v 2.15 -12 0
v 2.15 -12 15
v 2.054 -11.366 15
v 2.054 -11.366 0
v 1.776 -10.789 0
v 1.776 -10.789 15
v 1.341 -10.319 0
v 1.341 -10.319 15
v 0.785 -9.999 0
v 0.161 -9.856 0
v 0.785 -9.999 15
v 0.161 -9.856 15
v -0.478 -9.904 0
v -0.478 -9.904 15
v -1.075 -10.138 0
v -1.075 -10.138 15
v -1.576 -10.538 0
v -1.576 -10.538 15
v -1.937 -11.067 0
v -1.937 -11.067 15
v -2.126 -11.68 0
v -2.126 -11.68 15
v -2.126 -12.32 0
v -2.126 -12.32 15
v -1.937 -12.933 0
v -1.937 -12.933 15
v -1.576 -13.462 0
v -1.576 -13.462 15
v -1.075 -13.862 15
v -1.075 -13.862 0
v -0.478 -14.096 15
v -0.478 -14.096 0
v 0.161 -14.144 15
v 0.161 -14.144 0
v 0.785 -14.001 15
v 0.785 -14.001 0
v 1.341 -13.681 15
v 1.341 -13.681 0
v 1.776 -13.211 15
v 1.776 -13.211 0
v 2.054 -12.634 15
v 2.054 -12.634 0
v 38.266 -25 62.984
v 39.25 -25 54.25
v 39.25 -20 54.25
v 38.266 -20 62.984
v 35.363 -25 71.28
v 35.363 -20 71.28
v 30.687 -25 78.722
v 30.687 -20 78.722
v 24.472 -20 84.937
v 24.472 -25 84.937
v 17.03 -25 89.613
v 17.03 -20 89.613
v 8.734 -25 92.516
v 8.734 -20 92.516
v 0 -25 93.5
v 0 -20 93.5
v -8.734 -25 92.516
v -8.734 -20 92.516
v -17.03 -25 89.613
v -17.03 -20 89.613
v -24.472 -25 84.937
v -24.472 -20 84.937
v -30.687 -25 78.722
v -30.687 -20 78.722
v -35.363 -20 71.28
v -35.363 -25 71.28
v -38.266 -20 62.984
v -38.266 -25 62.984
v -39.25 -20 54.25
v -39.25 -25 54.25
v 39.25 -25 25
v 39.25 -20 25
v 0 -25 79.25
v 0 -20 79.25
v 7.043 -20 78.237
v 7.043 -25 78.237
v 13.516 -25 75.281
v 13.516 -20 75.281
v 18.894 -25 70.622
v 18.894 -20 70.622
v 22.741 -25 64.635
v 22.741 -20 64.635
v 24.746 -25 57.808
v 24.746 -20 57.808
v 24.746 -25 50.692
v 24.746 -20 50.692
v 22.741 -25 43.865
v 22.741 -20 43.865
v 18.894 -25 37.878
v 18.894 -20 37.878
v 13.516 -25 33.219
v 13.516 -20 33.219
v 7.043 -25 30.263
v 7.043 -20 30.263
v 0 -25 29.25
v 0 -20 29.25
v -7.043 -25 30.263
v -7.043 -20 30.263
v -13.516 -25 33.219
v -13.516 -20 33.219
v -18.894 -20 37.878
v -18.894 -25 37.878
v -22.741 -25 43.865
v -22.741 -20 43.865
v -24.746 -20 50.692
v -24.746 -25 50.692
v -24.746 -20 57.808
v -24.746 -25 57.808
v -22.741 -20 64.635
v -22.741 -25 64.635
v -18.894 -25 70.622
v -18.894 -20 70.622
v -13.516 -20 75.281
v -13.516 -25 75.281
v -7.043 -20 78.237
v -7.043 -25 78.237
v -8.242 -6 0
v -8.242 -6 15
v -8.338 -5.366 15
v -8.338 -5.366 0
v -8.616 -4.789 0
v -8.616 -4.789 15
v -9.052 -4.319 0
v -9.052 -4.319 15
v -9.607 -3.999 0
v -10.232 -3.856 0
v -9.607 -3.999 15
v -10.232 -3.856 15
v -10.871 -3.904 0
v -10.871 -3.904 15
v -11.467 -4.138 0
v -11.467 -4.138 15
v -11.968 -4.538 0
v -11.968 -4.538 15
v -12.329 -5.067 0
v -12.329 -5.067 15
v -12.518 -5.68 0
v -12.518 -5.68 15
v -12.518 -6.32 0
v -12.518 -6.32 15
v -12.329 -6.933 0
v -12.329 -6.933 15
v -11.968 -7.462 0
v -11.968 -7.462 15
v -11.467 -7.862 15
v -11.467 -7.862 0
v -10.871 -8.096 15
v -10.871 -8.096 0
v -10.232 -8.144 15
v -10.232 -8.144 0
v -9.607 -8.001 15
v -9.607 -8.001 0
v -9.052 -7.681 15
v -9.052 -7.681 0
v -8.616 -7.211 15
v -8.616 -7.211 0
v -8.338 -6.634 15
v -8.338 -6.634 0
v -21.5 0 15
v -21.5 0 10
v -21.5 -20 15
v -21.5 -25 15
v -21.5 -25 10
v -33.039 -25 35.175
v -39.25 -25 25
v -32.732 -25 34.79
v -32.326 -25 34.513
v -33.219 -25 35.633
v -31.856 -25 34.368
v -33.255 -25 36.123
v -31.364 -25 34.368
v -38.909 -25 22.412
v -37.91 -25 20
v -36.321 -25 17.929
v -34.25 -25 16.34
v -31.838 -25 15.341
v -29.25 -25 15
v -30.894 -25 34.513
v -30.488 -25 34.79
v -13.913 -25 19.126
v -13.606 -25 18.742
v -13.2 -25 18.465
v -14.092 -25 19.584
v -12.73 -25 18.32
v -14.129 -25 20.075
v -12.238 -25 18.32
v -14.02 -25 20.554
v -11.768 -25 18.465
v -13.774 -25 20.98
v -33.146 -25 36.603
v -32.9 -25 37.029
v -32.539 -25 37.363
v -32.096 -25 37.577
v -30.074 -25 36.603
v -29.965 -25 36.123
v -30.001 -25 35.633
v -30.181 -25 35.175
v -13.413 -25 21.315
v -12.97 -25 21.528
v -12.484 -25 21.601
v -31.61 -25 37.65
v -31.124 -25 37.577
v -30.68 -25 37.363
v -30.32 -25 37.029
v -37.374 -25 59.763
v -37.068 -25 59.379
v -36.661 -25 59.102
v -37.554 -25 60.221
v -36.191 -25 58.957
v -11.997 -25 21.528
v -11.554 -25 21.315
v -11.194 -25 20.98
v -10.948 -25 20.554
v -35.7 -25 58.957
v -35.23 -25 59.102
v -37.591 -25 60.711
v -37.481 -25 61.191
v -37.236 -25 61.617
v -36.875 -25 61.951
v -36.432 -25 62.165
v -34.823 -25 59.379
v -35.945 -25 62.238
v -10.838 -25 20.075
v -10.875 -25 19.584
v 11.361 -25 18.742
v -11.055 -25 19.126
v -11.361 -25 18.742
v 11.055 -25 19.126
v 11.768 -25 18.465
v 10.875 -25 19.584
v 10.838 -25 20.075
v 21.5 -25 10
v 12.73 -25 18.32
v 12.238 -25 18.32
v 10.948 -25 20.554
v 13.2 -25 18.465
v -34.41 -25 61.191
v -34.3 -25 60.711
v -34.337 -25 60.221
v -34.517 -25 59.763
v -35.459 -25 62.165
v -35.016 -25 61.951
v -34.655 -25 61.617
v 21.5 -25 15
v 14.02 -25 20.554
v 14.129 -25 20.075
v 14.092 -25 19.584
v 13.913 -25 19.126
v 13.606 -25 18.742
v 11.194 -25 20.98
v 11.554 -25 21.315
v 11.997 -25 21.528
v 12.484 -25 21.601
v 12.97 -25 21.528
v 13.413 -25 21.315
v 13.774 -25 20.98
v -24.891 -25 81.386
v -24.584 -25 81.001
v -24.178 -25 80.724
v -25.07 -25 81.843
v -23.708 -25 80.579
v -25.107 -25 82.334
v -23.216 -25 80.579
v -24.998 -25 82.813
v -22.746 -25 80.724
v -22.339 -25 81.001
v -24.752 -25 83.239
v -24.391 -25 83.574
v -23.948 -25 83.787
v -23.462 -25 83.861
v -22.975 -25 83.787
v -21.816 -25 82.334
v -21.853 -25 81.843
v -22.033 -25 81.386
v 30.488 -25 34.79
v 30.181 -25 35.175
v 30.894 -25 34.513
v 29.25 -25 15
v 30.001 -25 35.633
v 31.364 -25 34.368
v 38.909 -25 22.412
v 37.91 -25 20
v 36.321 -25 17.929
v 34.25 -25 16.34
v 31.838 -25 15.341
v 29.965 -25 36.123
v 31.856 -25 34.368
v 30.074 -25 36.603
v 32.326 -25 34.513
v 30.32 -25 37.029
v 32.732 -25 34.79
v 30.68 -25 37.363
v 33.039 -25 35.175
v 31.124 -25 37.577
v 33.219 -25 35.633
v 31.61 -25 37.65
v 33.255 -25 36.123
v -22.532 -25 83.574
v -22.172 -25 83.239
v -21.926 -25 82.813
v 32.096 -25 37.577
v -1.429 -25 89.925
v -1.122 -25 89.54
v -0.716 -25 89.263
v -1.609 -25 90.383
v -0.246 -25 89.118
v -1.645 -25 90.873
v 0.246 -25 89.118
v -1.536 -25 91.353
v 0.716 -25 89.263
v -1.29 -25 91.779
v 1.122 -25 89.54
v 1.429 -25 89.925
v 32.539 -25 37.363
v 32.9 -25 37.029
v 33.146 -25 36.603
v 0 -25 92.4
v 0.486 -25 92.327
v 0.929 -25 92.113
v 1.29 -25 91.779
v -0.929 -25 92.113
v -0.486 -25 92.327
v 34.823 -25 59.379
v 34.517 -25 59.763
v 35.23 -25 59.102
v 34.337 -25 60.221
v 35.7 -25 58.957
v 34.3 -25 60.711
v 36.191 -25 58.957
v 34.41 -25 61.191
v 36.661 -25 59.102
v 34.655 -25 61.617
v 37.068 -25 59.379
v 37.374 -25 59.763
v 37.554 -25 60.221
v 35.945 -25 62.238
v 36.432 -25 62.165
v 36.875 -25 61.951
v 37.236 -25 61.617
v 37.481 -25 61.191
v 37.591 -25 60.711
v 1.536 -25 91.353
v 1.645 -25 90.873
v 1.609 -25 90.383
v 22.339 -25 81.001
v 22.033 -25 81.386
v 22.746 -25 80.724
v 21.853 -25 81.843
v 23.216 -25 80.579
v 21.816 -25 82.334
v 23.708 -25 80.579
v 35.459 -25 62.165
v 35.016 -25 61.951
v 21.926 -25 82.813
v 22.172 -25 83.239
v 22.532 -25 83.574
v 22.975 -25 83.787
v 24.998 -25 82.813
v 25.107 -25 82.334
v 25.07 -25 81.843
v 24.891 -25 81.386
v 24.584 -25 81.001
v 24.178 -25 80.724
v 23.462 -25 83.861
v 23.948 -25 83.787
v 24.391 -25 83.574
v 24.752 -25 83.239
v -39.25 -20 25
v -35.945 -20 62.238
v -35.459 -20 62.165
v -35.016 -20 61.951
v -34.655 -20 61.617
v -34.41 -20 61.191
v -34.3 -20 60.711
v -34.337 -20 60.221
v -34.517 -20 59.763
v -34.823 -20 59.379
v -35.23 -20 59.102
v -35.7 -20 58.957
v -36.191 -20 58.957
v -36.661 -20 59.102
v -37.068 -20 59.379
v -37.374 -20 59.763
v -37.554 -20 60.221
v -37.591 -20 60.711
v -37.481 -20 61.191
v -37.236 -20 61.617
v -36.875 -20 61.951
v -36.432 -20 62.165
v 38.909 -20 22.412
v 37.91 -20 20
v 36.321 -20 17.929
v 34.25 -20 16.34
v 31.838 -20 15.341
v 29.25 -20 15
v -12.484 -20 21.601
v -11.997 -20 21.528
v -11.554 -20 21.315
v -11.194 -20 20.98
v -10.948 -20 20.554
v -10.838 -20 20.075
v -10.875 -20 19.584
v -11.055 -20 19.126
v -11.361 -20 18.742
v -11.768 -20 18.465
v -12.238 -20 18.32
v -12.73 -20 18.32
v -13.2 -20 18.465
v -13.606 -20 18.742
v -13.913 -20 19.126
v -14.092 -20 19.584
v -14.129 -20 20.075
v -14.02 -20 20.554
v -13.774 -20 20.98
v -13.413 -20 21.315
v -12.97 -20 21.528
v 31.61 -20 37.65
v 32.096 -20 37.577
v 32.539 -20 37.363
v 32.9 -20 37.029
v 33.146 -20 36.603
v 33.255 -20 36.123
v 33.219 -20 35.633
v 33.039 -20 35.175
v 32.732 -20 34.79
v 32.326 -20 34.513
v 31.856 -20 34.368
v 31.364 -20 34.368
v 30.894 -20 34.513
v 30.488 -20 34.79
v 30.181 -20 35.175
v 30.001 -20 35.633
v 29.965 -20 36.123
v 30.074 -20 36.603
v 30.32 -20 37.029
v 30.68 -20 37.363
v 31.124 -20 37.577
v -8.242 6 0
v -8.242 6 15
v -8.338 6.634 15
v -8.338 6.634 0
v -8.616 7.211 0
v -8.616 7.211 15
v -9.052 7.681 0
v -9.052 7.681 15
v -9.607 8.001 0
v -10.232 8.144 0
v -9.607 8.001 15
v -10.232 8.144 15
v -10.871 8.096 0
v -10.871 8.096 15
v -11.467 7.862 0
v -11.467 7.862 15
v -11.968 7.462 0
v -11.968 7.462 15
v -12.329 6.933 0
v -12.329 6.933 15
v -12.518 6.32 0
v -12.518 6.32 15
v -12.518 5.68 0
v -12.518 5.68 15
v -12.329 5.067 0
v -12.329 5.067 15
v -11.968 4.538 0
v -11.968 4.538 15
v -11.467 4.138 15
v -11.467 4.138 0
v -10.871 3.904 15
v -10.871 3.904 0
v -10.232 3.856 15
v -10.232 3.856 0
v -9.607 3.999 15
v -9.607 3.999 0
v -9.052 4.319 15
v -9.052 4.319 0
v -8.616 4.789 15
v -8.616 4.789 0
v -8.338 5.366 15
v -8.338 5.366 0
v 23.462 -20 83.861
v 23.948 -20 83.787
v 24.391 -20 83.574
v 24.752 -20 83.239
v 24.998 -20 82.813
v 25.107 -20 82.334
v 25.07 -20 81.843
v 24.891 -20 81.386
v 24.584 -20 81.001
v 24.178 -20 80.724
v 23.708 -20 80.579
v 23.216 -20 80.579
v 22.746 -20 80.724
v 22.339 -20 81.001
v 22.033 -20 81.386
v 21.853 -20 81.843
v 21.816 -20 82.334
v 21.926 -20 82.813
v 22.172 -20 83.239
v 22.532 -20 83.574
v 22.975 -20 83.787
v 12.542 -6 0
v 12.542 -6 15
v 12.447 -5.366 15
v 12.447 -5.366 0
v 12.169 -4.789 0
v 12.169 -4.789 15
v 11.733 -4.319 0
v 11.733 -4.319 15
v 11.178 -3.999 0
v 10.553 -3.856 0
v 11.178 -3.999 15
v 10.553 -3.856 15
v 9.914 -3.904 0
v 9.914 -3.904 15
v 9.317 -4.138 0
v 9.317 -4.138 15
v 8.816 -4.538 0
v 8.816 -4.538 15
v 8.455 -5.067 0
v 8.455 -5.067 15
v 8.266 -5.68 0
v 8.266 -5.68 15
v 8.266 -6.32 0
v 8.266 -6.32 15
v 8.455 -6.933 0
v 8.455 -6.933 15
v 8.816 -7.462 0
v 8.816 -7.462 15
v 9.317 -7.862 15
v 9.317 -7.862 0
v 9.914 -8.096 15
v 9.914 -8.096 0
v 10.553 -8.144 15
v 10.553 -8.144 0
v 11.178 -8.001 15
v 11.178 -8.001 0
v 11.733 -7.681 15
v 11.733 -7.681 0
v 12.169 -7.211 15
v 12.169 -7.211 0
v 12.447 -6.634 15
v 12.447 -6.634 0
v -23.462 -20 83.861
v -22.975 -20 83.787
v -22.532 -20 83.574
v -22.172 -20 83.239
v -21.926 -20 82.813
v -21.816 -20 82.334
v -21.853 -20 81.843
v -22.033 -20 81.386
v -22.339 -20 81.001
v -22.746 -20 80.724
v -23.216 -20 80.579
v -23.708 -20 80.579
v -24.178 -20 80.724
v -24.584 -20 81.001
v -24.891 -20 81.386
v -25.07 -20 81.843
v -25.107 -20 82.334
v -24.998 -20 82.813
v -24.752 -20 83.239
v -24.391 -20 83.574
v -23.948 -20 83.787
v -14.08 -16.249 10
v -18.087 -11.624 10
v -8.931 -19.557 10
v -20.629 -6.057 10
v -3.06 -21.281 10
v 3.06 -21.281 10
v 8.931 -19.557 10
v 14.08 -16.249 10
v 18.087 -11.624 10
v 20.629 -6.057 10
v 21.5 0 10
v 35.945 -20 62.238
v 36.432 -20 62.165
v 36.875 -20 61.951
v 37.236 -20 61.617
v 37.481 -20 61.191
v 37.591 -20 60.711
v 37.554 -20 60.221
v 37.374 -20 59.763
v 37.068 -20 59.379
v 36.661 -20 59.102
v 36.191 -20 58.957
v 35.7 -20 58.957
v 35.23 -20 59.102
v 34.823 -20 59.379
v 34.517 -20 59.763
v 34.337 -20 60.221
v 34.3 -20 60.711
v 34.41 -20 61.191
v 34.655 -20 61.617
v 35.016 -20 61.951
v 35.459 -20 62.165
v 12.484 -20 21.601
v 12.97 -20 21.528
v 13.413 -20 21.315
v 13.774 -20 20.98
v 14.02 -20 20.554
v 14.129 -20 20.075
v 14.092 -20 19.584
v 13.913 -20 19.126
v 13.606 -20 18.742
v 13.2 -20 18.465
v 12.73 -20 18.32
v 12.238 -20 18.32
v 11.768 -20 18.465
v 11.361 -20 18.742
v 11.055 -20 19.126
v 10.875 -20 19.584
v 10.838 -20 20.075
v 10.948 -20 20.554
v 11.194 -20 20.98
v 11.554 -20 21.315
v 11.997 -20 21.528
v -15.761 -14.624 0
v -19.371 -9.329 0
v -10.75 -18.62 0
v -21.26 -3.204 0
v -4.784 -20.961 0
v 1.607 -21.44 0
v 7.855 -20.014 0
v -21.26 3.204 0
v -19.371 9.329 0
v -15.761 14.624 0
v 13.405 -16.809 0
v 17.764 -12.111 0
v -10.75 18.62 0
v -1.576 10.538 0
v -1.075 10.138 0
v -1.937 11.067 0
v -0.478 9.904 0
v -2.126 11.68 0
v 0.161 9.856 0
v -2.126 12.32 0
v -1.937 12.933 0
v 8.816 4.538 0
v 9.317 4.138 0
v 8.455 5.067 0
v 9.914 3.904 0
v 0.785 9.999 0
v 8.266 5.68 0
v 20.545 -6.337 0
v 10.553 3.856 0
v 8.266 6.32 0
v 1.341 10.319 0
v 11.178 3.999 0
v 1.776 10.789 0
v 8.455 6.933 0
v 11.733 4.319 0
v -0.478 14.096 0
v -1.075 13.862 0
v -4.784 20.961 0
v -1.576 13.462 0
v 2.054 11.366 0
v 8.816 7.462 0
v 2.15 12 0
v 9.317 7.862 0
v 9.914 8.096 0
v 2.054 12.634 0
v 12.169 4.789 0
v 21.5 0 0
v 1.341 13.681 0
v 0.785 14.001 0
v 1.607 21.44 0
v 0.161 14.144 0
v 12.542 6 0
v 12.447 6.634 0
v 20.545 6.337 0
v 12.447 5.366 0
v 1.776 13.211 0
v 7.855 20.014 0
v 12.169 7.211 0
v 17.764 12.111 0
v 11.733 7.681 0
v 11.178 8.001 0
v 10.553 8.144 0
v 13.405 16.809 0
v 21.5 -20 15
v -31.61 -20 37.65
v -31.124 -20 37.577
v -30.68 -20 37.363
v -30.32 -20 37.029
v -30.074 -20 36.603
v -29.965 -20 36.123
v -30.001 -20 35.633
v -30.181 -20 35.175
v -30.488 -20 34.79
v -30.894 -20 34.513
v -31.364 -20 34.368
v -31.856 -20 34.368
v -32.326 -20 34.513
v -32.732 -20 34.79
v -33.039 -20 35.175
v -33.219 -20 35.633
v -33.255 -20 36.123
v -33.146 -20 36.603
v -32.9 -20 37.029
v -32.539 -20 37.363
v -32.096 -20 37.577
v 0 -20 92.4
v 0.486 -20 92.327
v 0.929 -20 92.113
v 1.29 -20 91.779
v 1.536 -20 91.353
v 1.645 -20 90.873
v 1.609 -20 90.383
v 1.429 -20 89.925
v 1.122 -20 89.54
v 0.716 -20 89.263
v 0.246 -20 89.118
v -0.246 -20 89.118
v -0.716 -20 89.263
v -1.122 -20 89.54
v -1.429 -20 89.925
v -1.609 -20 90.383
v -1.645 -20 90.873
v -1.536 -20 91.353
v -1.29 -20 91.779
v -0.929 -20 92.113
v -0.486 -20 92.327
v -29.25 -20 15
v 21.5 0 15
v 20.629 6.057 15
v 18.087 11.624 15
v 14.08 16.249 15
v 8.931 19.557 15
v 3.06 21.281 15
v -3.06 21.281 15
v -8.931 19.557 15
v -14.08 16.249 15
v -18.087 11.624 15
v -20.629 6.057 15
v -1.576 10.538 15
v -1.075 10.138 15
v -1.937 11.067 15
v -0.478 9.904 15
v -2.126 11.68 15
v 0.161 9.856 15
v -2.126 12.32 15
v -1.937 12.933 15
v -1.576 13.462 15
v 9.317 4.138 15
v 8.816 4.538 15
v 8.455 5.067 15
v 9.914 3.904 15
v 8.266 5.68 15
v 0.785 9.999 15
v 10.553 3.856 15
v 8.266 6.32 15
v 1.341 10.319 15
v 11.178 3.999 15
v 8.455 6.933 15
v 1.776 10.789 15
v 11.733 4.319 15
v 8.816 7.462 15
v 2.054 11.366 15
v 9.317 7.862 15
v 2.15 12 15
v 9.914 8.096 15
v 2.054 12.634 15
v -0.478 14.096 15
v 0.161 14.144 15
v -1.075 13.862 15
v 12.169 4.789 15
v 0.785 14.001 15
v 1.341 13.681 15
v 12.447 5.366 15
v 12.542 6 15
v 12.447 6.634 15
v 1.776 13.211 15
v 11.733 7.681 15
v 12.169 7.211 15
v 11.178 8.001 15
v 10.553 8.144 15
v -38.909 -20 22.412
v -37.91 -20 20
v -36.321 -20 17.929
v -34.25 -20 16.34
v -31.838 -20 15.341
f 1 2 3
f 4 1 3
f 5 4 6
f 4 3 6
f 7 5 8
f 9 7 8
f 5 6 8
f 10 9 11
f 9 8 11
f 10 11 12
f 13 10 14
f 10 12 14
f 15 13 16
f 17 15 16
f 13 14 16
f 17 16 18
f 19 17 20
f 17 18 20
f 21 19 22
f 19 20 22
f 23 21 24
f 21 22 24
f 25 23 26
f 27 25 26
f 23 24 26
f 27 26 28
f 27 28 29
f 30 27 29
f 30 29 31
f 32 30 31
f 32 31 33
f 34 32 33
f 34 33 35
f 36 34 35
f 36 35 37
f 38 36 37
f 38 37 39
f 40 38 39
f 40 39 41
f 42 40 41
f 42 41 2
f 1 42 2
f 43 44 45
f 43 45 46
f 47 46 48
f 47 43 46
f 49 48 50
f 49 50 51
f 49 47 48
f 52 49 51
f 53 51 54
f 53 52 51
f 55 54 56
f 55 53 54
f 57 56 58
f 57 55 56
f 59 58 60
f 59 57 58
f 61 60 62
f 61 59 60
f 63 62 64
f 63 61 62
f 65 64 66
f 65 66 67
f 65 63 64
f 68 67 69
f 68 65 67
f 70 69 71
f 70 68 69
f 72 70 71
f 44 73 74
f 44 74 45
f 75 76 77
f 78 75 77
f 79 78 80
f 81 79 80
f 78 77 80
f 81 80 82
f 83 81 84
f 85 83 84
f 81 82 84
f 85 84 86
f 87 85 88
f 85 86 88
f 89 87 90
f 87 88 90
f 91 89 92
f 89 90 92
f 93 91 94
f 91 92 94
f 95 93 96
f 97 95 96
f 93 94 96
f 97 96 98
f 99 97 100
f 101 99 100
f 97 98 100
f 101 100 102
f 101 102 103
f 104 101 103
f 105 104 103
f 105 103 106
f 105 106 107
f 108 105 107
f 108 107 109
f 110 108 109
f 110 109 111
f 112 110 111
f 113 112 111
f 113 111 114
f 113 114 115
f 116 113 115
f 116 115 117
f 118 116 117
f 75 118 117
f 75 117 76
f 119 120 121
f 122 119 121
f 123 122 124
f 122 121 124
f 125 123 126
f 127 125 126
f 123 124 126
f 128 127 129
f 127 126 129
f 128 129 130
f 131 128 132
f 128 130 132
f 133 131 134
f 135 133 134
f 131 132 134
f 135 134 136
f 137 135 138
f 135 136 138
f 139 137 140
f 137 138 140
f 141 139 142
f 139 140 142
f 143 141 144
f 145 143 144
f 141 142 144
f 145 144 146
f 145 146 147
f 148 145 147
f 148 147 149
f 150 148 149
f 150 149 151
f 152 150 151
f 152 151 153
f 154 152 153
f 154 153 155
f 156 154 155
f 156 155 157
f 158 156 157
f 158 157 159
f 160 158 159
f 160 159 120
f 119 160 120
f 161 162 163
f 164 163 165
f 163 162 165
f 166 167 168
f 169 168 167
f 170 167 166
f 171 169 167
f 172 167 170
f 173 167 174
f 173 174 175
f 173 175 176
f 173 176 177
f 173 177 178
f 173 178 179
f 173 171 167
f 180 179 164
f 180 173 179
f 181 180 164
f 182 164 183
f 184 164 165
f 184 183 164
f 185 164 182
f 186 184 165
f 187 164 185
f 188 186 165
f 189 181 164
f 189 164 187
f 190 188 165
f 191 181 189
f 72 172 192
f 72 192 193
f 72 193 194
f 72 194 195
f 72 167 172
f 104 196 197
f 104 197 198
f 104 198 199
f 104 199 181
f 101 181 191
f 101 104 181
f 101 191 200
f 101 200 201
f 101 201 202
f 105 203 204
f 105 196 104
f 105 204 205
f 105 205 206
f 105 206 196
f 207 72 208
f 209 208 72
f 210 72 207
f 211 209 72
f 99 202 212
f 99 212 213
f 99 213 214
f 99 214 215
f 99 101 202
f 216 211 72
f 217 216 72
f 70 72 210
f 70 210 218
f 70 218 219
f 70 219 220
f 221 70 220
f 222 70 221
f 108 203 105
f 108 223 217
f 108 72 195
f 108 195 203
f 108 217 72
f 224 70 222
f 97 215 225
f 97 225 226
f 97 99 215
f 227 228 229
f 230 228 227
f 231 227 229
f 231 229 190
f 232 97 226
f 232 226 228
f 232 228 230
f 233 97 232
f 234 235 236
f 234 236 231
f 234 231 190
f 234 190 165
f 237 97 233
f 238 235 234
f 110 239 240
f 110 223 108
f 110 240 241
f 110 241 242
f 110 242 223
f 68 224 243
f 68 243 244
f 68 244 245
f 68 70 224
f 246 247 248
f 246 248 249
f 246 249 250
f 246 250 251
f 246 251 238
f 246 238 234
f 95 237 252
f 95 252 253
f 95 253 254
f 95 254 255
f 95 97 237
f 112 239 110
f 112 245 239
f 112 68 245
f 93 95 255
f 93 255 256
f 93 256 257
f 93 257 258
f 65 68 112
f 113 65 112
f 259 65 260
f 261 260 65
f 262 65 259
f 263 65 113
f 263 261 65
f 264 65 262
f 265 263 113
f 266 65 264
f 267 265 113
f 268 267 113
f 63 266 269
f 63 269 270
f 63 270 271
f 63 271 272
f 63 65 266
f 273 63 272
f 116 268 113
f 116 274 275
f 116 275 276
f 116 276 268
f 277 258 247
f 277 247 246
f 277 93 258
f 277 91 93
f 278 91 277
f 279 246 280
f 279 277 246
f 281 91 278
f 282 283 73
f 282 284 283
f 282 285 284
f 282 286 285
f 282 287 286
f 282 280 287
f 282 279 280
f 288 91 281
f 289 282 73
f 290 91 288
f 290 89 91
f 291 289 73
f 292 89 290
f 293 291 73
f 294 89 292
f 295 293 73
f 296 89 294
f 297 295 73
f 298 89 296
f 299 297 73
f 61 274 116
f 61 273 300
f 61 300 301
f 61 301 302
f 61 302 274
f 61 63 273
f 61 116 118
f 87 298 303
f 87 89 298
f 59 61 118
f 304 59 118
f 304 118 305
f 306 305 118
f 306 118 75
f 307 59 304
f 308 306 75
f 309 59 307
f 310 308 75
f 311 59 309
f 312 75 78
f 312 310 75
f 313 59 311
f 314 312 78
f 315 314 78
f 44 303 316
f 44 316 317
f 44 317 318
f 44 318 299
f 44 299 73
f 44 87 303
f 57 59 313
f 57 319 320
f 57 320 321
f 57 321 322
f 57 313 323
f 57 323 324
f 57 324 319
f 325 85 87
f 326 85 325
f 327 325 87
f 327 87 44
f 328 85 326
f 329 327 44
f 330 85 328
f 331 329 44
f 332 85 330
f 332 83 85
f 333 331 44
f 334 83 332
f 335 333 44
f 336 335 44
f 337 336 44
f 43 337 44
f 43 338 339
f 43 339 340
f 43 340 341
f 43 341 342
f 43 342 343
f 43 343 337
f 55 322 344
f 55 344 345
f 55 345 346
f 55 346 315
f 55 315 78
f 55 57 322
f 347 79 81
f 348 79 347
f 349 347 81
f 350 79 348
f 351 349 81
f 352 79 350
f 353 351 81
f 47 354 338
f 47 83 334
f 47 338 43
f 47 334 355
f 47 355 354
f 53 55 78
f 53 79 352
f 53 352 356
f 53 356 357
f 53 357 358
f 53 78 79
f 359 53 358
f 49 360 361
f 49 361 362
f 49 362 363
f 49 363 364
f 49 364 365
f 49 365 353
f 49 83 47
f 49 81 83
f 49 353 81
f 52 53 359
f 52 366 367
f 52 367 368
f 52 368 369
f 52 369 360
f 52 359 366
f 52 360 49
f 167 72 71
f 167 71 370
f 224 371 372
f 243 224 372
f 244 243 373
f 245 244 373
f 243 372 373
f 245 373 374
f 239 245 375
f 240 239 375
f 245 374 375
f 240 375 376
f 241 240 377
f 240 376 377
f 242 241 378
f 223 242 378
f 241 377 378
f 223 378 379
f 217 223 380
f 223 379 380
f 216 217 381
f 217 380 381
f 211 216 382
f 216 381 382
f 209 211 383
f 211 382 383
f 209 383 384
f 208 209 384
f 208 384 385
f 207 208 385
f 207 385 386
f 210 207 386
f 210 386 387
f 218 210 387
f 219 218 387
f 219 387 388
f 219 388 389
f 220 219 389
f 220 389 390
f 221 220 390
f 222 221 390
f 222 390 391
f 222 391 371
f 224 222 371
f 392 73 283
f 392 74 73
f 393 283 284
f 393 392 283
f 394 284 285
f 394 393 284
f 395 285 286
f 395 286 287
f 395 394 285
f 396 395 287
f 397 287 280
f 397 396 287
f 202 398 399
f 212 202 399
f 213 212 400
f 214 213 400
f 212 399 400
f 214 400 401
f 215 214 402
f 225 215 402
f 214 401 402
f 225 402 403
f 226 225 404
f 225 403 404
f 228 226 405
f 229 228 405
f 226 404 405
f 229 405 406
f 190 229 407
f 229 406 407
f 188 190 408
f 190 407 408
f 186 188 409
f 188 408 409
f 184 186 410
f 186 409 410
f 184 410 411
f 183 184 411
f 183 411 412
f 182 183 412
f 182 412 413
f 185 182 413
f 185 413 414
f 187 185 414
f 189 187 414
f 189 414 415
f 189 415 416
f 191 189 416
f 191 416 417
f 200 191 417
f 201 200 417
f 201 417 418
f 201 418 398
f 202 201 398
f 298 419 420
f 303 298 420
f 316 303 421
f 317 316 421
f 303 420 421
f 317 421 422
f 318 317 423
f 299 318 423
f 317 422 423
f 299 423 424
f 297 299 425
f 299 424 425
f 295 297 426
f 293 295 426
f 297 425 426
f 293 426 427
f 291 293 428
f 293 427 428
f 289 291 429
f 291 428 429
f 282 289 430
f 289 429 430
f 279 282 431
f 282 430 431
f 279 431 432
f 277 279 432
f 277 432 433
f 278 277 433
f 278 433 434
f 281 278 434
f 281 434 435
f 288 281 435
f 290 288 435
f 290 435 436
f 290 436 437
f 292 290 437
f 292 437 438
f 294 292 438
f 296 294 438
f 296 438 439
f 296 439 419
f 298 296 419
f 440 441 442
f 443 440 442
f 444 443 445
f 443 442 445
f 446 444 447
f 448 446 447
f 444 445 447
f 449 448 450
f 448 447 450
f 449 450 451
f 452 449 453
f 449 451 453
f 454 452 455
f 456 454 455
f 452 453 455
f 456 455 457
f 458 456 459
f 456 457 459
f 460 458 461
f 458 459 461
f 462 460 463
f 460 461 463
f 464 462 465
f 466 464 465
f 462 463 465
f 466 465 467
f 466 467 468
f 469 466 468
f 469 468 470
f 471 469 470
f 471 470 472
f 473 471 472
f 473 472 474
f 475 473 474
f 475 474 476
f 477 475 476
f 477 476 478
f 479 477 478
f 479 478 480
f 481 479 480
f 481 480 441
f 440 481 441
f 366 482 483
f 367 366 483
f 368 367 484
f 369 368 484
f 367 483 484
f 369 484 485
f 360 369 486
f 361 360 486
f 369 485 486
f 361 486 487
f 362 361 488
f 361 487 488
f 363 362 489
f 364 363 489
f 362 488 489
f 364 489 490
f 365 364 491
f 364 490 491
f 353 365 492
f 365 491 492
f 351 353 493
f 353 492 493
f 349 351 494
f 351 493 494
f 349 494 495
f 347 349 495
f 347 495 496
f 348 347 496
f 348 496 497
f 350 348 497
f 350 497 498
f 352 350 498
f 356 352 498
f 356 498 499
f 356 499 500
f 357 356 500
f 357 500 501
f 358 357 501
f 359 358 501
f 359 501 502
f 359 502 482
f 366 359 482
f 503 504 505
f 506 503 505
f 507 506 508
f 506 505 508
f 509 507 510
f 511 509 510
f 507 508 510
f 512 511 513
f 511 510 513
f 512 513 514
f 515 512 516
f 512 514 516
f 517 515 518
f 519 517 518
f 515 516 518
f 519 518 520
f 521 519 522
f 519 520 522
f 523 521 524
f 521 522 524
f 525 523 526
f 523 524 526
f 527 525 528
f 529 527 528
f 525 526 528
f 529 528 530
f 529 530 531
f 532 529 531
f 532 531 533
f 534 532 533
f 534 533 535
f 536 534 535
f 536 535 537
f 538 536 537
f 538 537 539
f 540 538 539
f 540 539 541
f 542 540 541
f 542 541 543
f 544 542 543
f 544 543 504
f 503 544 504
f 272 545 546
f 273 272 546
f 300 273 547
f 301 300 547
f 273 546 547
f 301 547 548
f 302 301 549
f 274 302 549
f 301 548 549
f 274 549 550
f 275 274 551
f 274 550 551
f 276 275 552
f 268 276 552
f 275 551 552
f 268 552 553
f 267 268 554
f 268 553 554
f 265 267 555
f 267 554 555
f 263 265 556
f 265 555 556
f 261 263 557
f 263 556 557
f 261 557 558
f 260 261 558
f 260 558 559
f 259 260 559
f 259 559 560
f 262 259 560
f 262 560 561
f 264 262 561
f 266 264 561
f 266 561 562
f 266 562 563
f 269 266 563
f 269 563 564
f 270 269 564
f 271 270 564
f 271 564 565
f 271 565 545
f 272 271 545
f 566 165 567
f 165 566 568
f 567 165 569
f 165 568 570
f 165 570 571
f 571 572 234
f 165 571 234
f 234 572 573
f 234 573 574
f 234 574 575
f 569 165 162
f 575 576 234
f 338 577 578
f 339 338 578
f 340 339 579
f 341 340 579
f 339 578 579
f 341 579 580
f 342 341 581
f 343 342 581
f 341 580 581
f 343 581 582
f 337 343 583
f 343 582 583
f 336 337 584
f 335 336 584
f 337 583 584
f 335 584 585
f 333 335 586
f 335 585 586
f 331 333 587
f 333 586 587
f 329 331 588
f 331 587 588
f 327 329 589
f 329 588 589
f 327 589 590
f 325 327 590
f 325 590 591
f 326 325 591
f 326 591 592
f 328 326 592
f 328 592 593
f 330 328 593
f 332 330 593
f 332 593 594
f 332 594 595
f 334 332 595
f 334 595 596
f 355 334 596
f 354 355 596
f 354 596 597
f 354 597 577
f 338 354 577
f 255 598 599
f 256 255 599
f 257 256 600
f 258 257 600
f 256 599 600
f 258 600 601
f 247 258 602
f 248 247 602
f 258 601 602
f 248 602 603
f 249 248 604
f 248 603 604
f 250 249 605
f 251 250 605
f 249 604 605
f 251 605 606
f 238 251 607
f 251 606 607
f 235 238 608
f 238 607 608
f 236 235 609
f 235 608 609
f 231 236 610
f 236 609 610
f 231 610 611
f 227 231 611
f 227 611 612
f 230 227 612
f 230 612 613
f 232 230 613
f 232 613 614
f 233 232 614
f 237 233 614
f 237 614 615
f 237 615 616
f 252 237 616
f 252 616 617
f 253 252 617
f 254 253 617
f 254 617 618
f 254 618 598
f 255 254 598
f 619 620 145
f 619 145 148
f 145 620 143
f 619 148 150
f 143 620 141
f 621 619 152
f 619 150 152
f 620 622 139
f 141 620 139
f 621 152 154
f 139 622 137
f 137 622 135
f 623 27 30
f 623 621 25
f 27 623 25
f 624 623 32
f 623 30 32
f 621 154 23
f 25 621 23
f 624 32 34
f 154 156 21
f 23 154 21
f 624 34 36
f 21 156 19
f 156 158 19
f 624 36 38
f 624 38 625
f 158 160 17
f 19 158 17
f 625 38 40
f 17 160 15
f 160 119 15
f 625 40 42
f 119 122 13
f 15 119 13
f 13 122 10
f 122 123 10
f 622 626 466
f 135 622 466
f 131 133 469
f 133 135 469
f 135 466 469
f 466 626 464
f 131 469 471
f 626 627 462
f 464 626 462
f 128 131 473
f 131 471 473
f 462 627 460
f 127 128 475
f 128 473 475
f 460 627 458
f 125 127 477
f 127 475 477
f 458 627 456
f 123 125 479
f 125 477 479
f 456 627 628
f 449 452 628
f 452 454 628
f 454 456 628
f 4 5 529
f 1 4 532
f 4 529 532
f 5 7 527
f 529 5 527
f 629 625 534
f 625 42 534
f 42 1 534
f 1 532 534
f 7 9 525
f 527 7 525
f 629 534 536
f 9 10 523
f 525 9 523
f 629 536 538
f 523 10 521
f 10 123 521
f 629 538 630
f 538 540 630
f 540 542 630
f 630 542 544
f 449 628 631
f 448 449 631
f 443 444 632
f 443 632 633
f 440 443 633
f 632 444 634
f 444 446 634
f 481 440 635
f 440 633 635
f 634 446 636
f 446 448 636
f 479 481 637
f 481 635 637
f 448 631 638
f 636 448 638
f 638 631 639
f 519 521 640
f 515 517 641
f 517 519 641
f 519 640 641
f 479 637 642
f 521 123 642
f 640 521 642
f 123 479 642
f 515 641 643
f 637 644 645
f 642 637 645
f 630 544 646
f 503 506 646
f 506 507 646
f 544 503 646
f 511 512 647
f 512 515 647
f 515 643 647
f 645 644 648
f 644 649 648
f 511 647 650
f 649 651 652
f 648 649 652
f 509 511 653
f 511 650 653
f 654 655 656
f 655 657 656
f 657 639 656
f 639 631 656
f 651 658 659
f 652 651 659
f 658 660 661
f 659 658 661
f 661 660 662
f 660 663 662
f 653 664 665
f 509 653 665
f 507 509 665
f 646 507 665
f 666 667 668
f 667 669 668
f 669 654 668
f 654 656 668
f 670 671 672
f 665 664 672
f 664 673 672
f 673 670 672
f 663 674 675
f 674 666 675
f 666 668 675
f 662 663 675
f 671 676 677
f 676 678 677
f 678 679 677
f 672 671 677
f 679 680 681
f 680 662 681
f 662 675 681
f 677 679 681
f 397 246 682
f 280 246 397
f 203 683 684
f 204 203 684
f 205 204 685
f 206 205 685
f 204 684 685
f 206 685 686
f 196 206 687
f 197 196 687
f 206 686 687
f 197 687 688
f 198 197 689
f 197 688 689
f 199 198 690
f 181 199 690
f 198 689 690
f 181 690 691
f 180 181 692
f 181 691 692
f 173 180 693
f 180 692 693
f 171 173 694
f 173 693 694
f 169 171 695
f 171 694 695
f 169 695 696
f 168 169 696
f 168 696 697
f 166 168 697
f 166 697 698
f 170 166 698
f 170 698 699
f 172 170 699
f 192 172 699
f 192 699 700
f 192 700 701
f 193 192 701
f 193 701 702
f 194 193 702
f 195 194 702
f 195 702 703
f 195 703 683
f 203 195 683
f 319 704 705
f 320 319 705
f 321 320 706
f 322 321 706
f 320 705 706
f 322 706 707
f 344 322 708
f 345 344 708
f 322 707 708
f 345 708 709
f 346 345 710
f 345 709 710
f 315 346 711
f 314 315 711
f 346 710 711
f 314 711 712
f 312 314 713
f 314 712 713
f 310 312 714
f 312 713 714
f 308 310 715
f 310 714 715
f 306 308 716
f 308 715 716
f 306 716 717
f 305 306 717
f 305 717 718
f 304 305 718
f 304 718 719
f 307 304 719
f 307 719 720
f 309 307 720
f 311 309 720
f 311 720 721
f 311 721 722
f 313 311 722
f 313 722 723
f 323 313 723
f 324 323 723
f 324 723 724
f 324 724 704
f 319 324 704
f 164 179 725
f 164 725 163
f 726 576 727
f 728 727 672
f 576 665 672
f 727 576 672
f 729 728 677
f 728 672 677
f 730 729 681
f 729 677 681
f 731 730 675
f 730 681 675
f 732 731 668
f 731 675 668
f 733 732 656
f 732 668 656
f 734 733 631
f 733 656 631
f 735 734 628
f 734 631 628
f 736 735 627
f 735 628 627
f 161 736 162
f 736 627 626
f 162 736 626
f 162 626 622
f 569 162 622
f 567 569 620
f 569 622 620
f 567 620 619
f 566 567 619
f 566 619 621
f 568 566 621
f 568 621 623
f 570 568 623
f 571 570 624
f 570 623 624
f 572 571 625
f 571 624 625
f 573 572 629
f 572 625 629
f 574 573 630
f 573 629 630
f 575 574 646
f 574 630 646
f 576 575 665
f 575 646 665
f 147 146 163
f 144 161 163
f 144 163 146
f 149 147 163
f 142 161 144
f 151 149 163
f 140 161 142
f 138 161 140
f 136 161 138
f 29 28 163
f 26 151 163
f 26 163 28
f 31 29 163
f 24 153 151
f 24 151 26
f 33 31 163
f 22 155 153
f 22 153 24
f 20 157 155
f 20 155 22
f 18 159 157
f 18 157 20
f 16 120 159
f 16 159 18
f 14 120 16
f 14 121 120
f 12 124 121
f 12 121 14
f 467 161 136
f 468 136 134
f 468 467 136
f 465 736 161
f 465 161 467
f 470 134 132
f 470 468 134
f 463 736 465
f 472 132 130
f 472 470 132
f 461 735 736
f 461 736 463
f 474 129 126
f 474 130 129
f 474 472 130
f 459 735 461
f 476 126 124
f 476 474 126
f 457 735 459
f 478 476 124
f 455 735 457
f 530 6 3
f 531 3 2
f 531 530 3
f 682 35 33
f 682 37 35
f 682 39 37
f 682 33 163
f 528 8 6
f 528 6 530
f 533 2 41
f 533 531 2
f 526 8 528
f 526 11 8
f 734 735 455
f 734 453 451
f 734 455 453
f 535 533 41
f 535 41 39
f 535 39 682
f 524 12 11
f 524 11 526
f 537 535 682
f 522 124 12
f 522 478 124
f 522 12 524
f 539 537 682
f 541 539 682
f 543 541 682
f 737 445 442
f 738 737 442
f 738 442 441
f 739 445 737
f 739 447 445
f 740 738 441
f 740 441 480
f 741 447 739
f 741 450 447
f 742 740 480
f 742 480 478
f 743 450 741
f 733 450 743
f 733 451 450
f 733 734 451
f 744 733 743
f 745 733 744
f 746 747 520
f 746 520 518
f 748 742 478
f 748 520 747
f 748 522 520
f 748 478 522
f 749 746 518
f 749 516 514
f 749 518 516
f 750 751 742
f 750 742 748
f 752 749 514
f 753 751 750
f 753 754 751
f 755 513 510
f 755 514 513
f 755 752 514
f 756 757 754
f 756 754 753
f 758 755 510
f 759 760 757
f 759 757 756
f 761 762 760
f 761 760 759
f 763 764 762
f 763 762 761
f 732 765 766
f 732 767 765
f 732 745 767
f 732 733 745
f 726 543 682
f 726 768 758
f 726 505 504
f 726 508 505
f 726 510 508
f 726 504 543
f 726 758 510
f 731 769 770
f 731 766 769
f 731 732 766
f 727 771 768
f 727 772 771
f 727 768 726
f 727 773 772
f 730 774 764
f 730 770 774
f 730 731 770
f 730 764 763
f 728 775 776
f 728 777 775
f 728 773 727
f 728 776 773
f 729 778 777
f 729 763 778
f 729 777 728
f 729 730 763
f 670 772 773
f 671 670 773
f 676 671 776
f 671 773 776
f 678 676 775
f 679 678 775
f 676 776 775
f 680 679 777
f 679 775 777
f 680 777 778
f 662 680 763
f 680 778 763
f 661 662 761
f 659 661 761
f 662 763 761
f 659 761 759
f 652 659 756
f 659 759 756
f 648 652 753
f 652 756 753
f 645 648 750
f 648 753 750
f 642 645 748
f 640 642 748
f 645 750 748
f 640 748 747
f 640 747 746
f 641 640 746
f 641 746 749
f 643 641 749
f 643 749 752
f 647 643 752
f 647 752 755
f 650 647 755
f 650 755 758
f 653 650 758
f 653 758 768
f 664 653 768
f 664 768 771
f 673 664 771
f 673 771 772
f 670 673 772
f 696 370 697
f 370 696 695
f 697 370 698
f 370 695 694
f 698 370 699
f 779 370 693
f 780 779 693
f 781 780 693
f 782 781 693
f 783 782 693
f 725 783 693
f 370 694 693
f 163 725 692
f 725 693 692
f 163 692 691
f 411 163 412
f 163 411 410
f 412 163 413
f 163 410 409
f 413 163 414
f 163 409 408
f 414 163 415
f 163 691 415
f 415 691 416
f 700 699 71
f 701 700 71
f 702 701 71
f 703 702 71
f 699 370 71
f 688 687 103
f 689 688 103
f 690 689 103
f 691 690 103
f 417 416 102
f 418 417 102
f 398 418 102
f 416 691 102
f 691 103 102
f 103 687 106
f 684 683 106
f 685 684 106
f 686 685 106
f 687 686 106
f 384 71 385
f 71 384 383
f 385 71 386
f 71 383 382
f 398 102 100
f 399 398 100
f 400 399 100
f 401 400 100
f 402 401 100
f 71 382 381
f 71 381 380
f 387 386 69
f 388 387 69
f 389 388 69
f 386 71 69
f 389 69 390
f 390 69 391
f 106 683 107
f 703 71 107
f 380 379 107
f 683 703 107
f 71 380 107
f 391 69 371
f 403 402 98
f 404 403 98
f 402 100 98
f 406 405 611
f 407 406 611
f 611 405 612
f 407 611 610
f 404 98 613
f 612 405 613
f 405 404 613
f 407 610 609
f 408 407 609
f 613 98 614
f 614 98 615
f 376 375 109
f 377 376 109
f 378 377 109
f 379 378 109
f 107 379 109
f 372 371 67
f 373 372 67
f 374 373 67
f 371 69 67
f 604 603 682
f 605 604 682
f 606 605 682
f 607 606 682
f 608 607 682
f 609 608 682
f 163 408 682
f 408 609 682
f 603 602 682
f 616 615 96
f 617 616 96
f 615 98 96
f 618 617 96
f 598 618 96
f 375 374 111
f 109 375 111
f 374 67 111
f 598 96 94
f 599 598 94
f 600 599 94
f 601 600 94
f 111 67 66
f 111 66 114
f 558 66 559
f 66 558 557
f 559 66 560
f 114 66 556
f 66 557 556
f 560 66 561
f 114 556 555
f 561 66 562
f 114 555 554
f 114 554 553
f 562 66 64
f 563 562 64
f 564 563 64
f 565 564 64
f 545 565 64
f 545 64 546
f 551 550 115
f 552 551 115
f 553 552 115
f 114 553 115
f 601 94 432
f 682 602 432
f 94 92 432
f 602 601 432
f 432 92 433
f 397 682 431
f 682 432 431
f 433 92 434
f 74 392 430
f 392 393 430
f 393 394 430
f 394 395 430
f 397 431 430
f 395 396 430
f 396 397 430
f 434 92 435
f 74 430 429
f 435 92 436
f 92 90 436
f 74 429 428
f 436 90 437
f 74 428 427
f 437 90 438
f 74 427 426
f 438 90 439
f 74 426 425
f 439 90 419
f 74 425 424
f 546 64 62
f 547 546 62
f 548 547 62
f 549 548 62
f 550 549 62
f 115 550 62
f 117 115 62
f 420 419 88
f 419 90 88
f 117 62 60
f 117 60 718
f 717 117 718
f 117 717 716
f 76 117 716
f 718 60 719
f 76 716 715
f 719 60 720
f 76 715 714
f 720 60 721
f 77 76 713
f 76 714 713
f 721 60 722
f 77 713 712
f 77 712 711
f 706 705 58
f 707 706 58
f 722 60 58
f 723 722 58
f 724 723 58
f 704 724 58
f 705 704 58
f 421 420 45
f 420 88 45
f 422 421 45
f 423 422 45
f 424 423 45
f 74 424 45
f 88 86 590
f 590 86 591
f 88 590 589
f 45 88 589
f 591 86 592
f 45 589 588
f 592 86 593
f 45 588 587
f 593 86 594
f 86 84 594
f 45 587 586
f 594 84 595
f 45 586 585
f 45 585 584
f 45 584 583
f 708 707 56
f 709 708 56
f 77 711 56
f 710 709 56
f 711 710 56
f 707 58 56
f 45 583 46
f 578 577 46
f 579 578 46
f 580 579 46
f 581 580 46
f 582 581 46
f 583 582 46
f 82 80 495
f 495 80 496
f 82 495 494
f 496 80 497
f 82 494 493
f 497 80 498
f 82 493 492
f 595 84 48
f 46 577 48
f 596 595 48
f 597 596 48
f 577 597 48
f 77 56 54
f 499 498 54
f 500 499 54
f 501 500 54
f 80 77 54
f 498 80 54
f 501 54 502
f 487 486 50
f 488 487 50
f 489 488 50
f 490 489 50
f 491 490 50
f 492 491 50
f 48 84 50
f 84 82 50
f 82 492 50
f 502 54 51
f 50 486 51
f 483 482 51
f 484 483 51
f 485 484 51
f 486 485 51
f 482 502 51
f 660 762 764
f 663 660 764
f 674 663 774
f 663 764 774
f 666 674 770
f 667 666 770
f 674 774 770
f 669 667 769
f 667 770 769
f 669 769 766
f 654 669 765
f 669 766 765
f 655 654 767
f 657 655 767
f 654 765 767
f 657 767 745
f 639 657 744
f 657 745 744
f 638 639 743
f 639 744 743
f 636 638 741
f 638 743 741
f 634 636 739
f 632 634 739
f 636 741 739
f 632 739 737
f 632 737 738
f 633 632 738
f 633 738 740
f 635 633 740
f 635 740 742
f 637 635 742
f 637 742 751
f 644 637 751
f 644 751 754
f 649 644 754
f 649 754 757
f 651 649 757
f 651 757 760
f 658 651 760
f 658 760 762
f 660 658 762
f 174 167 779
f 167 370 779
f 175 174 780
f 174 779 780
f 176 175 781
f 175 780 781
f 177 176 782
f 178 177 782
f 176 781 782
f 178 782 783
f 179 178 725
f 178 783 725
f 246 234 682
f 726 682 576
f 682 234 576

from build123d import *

# Parameters (mm, degrees)
SKETCH_1_R          = 21.5
EXTRUDE_1_DEPTH     = 10
EXTRUDE_2_DEPTH     = 5
EXTRUDE_3_DEPTH     = 5
FILLET_1_R          = 10
SKETCH_4_R          = 25
CUT_EXTRUDE_1_DEPTH = 110.56761611
SKETCH_5_R          = 1.65
CUT_EXTRUDE_2_DEPTH = 110.56761611
SKETCH_6_R          = 2.15
CUT_EXTRUDE_3_DEPTH = 92.256849058


with BuildPart() as part:
    # ｽｹｯﾁ1 → ﾎﾞｽ - 押し出し1 (new body)
    with BuildSketch(Plane.XY):
        Circle(SKETCH_1_R)
    extrude(amount=EXTRUDE_1_DEPTH)

    # ｽｹｯﾁ2 → ﾎﾞｽ - 押し出し2 (add)
    with BuildSketch(Plane.XY.offset(10)):
        with BuildLine():
            Line((-21.5, 0), (-21.5, -25))
            Line((-21.5, -25), (21.5, -25))
            Line((21.5, -25), (21.5, 0))
            ThreePointArc((21.5, 0), (0, 21.5), (-21.5, 0))
        make_face()
    extrude(amount=EXTRUDE_2_DEPTH)

    # ｽｹｯﾁ3 → ﾎﾞｽ - 押し出し3 (add)
    with BuildSketch(Plane.XZ.offset(25)):
        with BuildLine():
            Line((-39.25, 54.25), (-39.25, 15))
            Line((-39.25, 15), (39.25, 15))
            Line((39.25, 15), (39.25, 54.25))
            ThreePointArc((39.25, 54.25), (0, 93.5), (-39.25, 54.25))
        make_face()
    extrude(amount=-EXTRUDE_3_DEPTH)

    # ﾌｨﾚｯﾄ1
    fillet_1_edges = [part.edges().sort_by_distance(p)[0] for p in [
        (39.25, -22.5, 15),
        (-39.25, -22.5, 15),
    ]]
    fillet(fillet_1_edges, radius=FILLET_1_R)

    # ｽｹｯﾁ4 → ｶｯﾄ - 押し出し1 (cut, through all)
    with BuildSketch(Plane(origin=(0, -20, 0), x_dir=(1, 0, 0), z_dir=(0, 1, 0))):
        with Locations(Location((0, -54.25, 0), (0, 0, 270))):
            Circle(SKETCH_4_R)
    extrude(amount=-CUT_EXTRUDE_1_DEPTH, mode=Mode.SUBTRACT)

    # ｽｹｯﾁ5 → ｶｯﾄ - 押し出し2 (cut, through all)
    with BuildSketch(Plane(origin=(0, -20, 0), x_dir=(1, 0, 0), z_dir=(0, 1, 0))):
        with Locations(Location((0, -90.75, 0), (0, 0, 270))):
            Circle(SKETCH_5_R)
        with Locations(Location((-23.461747754, -82.210622174, 0), (0, 0, 270))):
            Circle(SKETCH_5_R)
        with Locations(Location((-35.945482985, -60.588158485, 0), (0, 0, 270))):
            Circle(SKETCH_5_R)
        with Locations(Location((-31.609927238, -36, 0), (0, 0, 270))):
            Circle(SKETCH_5_R)
        with Locations(Location((-12.483735231, -19.951219341, 0), (0, 0, 270))):
            Circle(SKETCH_5_R)
        with Locations(Location((12.483735231, -19.951219341, 0), (0, 0, 270))):
            Circle(SKETCH_5_R)
        with Locations(Location((31.609927238, -36, 0), (0, 0, 270))):
            Circle(SKETCH_5_R)
        with Locations(Location((35.945482985, -60.588158485, 0), (0, 0, 270))):
            Circle(SKETCH_5_R)
        with Locations(Location((23.461747754, -82.210622174, 0), (0, 0, 270))):
            Circle(SKETCH_5_R)
    extrude(amount=-CUT_EXTRUDE_2_DEPTH, mode=Mode.SUBTRACT)

    # ｽｹｯﾁ6 → ｶｯﾄ - 押し出し3 (cut, through all)
    with BuildSketch(Plane.XY.offset(15)):
        with Locations((0, 12)):
            Circle(SKETCH_6_R)
        with Locations((10.392304845, 6)):
            Circle(SKETCH_6_R)
        with Locations((10.392304845, -6)):
            Circle(SKETCH_6_R)
        with Locations((0, -12)):
            Circle(SKETCH_6_R)
        with Locations((-10.392304845, -6)):
            Circle(SKETCH_6_R)
        with Locations((-10.392304845, 6)):
            Circle(SKETCH_6_R)
    extrude(amount=-CUT_EXTRUDE_3_DEPTH, mode=Mode.SUBTRACT)


solid = part.part
